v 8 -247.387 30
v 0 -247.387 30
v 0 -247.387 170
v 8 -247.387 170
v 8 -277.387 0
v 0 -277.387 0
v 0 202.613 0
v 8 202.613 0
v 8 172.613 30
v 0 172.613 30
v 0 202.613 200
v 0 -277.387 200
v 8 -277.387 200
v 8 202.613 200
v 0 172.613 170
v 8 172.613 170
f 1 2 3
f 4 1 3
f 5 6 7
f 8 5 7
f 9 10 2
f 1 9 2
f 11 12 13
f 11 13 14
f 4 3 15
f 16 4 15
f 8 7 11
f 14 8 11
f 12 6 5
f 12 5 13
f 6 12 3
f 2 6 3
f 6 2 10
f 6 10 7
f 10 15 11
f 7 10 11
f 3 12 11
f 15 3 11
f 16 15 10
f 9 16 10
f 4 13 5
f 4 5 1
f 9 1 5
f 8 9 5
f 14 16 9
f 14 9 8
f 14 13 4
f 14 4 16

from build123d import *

# Parameters (mm, degrees)
F0_W     = 480
F0_H     = 200
F1_DEPTH = 8


with BuildPart() as f1:
    # F0 (on Right) → F1 (new body)
    with BuildSketch(Plane.YZ):
        with Locations((-37.386954, 100)):
            Rectangle(F0_W, F0_H)
        Polygon((-247.386954, 30), (-247.386954, 170), (-107.386954, 170), (32.613046, 170), (172.613046, 170), (172.613046, 30), (32.613046, 30), (-107.386954, 30), align=None, mode=Mode.SUBTRACT)
    extrude(amount=F1_DEPTH)


solid = f1.part
